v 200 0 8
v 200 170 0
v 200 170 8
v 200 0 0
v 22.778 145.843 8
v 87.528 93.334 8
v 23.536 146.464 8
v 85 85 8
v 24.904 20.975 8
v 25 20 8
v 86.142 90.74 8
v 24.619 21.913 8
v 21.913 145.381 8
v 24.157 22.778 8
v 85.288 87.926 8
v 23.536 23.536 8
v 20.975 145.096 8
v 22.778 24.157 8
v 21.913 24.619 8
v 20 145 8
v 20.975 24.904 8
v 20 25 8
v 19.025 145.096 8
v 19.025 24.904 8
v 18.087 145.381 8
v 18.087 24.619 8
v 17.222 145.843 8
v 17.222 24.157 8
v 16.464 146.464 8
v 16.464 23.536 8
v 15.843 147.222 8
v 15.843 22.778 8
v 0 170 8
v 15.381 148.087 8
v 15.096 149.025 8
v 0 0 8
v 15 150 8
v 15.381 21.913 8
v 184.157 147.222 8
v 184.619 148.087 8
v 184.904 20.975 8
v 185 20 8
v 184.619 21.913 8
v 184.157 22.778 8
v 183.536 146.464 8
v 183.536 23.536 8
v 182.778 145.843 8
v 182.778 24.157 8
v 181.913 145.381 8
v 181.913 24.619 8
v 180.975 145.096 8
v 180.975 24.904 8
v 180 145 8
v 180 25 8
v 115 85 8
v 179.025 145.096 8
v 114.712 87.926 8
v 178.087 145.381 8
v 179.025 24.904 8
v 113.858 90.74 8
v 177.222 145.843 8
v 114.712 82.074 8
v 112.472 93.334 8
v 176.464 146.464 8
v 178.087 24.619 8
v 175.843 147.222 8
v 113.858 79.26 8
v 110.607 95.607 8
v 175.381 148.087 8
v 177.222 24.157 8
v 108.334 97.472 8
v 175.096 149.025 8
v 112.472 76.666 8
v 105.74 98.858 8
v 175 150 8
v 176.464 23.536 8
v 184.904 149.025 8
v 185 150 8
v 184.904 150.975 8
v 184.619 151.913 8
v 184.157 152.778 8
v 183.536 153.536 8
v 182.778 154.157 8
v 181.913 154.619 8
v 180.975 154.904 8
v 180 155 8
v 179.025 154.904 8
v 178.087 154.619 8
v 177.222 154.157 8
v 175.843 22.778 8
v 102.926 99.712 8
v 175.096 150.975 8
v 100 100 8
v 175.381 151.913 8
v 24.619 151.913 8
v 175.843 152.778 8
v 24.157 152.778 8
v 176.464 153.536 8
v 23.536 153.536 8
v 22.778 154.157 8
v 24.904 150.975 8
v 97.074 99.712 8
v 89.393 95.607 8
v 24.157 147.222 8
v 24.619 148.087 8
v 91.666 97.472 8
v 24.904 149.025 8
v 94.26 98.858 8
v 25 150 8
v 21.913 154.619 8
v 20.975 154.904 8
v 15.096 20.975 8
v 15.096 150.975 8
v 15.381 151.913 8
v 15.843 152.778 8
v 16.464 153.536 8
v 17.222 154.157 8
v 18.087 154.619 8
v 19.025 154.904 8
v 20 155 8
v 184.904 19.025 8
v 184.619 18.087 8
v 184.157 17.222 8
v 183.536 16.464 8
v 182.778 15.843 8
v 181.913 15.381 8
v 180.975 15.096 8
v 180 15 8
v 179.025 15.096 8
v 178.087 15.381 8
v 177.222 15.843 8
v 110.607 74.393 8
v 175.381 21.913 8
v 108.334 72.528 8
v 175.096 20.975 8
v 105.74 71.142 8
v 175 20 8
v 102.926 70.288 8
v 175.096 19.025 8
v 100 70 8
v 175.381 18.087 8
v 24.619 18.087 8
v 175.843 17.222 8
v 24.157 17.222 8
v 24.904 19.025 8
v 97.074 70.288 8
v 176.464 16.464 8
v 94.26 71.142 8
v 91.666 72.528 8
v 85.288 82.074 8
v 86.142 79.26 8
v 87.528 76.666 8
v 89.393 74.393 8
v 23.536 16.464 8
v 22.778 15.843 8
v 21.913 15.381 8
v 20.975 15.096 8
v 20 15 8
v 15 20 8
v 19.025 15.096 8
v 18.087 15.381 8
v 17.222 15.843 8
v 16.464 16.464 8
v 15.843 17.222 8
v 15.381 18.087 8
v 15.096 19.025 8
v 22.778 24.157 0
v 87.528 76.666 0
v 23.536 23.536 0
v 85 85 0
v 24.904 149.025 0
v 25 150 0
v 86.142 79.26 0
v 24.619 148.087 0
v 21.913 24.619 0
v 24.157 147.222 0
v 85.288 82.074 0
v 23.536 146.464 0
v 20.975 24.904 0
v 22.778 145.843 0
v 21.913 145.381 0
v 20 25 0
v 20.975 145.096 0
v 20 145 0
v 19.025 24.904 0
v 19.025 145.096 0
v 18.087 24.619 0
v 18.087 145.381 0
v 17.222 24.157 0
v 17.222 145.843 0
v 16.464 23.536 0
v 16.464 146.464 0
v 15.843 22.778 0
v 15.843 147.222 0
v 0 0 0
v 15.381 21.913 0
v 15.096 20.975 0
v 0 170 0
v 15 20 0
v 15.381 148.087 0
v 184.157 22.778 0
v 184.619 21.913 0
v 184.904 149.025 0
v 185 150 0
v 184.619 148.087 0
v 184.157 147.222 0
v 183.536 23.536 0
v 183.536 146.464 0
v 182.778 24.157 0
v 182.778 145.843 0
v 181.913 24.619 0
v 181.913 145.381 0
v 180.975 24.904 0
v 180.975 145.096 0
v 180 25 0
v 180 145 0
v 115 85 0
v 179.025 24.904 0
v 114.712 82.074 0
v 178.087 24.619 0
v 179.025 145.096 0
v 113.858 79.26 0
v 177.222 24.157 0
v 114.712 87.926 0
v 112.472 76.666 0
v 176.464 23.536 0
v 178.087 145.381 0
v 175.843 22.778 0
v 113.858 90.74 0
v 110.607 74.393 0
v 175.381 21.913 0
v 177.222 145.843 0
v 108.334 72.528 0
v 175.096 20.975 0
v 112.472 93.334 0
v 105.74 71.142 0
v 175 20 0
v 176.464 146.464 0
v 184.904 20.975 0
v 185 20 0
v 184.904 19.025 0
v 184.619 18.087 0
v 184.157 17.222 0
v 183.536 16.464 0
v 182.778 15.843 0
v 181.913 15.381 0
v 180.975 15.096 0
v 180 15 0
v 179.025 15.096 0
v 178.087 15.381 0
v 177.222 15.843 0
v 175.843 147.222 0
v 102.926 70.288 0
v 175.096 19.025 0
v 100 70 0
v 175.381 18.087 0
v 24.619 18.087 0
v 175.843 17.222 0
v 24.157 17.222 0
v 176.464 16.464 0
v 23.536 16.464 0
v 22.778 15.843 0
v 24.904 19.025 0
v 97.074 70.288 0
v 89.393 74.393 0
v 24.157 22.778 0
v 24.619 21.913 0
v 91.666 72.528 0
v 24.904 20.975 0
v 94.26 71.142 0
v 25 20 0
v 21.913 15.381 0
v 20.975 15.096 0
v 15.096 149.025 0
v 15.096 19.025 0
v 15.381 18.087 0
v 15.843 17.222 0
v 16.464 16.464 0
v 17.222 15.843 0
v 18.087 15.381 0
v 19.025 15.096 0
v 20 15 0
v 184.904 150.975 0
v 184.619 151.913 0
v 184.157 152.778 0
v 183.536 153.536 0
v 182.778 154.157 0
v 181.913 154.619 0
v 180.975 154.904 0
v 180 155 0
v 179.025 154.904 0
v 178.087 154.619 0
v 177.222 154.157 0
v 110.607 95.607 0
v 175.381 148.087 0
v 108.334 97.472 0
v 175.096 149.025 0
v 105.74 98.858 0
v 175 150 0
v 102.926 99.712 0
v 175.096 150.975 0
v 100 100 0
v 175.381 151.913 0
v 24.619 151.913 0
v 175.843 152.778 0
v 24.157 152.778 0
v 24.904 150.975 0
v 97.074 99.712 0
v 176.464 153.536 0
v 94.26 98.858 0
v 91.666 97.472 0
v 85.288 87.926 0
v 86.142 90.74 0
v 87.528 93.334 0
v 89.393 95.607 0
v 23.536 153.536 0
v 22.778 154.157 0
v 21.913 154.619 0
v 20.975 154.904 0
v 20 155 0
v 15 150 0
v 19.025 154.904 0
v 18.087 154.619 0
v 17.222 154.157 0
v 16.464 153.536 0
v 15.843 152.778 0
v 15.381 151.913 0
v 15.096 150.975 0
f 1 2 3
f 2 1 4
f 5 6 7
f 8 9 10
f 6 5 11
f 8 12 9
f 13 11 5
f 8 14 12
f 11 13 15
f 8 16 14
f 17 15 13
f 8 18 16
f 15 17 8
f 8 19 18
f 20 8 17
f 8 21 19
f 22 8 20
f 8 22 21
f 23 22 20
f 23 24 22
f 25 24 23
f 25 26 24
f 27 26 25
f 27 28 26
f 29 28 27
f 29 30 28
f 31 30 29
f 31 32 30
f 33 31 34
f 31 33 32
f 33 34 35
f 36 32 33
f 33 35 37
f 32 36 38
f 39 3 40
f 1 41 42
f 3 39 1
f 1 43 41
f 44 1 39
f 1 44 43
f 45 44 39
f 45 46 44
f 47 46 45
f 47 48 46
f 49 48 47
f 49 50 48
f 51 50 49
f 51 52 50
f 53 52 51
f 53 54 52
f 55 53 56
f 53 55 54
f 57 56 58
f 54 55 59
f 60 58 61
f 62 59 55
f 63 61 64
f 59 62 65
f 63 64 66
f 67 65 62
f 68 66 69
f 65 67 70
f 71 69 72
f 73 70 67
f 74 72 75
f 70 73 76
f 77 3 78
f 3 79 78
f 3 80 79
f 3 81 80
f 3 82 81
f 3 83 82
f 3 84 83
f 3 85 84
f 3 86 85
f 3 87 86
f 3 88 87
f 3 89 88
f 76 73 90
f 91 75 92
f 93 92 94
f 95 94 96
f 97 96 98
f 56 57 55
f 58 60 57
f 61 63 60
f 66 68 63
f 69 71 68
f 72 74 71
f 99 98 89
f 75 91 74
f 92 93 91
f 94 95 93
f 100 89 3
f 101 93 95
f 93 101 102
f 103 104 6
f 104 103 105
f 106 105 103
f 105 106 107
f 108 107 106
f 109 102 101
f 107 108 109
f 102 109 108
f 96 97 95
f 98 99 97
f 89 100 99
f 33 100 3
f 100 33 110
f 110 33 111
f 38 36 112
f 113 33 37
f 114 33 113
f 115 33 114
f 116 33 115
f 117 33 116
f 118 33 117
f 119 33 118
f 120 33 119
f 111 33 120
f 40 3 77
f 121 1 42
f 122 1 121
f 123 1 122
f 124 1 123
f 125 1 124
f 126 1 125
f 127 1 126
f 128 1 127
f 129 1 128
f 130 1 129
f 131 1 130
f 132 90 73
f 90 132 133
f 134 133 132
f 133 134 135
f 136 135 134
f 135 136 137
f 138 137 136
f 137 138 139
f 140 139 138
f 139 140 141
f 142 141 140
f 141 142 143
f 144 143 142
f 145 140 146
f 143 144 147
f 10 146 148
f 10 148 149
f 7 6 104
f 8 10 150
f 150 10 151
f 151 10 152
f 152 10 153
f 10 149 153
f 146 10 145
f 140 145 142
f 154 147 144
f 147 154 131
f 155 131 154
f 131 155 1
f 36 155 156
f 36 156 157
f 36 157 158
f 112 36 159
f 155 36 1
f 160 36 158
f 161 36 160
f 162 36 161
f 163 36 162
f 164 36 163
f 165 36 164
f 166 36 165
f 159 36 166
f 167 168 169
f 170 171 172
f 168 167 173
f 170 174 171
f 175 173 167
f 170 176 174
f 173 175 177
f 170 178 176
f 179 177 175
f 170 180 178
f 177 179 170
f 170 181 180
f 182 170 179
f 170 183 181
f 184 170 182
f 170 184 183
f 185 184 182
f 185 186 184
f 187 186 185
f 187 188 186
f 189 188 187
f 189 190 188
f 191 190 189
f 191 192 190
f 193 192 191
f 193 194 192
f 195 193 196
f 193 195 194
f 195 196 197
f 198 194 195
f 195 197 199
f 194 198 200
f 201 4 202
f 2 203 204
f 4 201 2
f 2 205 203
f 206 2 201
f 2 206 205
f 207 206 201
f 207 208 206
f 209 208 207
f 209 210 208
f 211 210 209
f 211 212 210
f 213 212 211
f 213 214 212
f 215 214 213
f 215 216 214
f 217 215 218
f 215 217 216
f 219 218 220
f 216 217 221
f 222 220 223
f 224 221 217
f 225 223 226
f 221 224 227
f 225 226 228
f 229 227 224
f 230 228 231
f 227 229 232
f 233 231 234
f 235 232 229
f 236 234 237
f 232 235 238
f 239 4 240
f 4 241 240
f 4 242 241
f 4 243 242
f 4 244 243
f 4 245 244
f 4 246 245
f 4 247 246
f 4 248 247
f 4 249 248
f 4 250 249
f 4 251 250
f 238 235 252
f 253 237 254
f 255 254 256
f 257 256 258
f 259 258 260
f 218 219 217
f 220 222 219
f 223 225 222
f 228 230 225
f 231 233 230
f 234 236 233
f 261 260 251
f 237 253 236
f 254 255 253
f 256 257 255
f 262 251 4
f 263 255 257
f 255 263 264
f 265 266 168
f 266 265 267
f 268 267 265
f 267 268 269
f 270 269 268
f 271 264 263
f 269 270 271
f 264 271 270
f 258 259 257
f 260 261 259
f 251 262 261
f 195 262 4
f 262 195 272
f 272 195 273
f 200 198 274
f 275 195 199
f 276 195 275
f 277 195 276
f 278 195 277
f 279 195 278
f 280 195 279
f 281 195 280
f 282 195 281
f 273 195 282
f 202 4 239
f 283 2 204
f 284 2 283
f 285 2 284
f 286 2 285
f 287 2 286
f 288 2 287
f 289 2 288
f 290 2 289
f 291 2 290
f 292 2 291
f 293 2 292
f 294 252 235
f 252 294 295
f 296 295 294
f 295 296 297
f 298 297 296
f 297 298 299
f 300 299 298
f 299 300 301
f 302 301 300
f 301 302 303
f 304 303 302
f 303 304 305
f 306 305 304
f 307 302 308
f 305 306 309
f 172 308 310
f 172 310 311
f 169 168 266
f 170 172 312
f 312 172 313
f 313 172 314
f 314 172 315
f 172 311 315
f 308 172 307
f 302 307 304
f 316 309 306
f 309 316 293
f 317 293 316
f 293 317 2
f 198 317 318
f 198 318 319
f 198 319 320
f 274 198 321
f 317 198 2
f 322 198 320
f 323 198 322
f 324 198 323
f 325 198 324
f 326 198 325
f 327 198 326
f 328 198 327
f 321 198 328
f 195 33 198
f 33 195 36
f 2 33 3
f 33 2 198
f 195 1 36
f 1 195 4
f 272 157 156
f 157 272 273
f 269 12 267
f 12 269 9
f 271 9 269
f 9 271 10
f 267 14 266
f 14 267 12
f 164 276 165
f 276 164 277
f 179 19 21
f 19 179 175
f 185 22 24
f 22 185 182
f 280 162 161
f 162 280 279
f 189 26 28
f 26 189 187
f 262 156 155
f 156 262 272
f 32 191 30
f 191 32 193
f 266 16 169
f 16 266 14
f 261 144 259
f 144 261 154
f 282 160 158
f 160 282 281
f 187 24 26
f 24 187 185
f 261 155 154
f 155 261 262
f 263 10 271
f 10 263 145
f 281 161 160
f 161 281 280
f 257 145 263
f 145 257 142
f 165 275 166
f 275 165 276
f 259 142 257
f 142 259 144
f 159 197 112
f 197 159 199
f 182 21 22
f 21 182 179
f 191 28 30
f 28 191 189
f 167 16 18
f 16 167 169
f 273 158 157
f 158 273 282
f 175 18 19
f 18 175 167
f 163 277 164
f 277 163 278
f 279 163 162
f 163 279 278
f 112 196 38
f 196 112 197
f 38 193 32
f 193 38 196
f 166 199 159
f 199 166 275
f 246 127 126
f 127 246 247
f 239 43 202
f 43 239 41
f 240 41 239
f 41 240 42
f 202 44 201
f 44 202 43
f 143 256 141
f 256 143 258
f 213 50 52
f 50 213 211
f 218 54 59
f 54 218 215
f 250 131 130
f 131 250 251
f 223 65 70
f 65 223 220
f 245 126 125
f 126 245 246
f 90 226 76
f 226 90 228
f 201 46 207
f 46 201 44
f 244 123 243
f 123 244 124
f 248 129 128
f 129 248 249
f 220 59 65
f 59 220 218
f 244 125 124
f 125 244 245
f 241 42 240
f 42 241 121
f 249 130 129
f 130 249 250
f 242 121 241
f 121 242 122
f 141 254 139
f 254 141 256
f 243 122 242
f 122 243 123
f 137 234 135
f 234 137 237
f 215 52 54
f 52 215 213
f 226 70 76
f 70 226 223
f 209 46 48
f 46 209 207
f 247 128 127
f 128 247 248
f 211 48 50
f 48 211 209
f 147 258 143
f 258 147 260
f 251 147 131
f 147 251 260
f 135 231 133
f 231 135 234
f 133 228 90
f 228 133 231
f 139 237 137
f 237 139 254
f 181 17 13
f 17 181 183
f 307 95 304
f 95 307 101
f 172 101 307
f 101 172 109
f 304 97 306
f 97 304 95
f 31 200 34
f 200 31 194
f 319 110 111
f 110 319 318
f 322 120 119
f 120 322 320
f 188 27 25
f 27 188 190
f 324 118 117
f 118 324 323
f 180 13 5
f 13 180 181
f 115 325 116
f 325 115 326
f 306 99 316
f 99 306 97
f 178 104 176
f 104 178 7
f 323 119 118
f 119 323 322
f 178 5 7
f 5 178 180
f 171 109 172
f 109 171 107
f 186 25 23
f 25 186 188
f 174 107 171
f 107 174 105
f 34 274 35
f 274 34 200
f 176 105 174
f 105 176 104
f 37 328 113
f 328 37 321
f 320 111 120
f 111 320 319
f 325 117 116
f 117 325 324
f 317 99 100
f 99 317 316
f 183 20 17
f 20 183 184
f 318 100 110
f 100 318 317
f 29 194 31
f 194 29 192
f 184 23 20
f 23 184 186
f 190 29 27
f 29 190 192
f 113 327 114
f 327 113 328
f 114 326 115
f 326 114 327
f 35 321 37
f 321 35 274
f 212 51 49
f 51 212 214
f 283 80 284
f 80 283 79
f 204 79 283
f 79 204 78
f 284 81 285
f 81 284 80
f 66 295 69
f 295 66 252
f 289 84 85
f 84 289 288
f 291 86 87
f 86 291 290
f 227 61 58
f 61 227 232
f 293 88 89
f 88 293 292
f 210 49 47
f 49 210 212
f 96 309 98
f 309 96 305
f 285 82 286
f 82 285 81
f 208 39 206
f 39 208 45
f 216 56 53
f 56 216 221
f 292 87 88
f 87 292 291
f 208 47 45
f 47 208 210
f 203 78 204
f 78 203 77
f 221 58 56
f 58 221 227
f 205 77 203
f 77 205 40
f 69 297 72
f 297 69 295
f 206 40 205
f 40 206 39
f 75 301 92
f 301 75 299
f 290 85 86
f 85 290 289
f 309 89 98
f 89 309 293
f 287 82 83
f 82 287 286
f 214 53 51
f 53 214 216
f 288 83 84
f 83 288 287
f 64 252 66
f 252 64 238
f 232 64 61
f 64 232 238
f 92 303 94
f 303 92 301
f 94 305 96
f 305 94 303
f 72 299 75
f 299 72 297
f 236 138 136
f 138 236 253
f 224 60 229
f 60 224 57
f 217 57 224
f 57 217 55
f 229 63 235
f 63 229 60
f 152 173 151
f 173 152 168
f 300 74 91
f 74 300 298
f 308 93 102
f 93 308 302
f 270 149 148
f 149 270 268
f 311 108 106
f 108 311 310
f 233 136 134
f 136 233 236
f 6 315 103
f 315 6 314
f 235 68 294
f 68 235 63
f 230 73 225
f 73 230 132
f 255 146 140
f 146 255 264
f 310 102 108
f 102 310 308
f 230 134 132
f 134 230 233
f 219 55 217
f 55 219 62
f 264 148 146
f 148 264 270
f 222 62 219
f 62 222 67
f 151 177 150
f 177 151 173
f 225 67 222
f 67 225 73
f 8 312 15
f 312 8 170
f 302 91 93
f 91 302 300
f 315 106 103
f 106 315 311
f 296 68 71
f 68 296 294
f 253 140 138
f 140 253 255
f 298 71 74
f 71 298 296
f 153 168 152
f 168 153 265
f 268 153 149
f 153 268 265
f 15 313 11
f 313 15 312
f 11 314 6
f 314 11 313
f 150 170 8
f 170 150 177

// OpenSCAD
$fn = 32;

// ----------------------------------------------------------------------
// Big plate: 200-250 mm adapter plate
// ----------------------------------------------------------------------

// --- parameters (mm) ---
plate_l = 200;            // plate length, X
plate_w = 170;            // plate width, Y
plate_t = 8;              // plate thickness, Z
corner_d = 10;            // corner hole diameter
corner_in = 20;           // corner hole inset from the edges
bore_d = 30;              // central bore

difference() {
  cube([plate_l, plate_w, plate_t]);
  translate([corner_in, corner_in, -1]) cylinder(h = plate_t + 2, d = corner_d);
  translate([plate_l - corner_in, corner_in, -1]) cylinder(h = plate_t + 2, d = corner_d);
  translate([corner_in, plate_w - corner_in, -1]) cylinder(h = plate_t + 2, d = corner_d);
  translate([plate_l - corner_in, plate_w - corner_in, -1]) cylinder(h = plate_t + 2, d = corner_d);
  translate([plate_l / 2, plate_w / 2, -1]) cylinder(h = plate_t + 2, d = bore_d);
}
